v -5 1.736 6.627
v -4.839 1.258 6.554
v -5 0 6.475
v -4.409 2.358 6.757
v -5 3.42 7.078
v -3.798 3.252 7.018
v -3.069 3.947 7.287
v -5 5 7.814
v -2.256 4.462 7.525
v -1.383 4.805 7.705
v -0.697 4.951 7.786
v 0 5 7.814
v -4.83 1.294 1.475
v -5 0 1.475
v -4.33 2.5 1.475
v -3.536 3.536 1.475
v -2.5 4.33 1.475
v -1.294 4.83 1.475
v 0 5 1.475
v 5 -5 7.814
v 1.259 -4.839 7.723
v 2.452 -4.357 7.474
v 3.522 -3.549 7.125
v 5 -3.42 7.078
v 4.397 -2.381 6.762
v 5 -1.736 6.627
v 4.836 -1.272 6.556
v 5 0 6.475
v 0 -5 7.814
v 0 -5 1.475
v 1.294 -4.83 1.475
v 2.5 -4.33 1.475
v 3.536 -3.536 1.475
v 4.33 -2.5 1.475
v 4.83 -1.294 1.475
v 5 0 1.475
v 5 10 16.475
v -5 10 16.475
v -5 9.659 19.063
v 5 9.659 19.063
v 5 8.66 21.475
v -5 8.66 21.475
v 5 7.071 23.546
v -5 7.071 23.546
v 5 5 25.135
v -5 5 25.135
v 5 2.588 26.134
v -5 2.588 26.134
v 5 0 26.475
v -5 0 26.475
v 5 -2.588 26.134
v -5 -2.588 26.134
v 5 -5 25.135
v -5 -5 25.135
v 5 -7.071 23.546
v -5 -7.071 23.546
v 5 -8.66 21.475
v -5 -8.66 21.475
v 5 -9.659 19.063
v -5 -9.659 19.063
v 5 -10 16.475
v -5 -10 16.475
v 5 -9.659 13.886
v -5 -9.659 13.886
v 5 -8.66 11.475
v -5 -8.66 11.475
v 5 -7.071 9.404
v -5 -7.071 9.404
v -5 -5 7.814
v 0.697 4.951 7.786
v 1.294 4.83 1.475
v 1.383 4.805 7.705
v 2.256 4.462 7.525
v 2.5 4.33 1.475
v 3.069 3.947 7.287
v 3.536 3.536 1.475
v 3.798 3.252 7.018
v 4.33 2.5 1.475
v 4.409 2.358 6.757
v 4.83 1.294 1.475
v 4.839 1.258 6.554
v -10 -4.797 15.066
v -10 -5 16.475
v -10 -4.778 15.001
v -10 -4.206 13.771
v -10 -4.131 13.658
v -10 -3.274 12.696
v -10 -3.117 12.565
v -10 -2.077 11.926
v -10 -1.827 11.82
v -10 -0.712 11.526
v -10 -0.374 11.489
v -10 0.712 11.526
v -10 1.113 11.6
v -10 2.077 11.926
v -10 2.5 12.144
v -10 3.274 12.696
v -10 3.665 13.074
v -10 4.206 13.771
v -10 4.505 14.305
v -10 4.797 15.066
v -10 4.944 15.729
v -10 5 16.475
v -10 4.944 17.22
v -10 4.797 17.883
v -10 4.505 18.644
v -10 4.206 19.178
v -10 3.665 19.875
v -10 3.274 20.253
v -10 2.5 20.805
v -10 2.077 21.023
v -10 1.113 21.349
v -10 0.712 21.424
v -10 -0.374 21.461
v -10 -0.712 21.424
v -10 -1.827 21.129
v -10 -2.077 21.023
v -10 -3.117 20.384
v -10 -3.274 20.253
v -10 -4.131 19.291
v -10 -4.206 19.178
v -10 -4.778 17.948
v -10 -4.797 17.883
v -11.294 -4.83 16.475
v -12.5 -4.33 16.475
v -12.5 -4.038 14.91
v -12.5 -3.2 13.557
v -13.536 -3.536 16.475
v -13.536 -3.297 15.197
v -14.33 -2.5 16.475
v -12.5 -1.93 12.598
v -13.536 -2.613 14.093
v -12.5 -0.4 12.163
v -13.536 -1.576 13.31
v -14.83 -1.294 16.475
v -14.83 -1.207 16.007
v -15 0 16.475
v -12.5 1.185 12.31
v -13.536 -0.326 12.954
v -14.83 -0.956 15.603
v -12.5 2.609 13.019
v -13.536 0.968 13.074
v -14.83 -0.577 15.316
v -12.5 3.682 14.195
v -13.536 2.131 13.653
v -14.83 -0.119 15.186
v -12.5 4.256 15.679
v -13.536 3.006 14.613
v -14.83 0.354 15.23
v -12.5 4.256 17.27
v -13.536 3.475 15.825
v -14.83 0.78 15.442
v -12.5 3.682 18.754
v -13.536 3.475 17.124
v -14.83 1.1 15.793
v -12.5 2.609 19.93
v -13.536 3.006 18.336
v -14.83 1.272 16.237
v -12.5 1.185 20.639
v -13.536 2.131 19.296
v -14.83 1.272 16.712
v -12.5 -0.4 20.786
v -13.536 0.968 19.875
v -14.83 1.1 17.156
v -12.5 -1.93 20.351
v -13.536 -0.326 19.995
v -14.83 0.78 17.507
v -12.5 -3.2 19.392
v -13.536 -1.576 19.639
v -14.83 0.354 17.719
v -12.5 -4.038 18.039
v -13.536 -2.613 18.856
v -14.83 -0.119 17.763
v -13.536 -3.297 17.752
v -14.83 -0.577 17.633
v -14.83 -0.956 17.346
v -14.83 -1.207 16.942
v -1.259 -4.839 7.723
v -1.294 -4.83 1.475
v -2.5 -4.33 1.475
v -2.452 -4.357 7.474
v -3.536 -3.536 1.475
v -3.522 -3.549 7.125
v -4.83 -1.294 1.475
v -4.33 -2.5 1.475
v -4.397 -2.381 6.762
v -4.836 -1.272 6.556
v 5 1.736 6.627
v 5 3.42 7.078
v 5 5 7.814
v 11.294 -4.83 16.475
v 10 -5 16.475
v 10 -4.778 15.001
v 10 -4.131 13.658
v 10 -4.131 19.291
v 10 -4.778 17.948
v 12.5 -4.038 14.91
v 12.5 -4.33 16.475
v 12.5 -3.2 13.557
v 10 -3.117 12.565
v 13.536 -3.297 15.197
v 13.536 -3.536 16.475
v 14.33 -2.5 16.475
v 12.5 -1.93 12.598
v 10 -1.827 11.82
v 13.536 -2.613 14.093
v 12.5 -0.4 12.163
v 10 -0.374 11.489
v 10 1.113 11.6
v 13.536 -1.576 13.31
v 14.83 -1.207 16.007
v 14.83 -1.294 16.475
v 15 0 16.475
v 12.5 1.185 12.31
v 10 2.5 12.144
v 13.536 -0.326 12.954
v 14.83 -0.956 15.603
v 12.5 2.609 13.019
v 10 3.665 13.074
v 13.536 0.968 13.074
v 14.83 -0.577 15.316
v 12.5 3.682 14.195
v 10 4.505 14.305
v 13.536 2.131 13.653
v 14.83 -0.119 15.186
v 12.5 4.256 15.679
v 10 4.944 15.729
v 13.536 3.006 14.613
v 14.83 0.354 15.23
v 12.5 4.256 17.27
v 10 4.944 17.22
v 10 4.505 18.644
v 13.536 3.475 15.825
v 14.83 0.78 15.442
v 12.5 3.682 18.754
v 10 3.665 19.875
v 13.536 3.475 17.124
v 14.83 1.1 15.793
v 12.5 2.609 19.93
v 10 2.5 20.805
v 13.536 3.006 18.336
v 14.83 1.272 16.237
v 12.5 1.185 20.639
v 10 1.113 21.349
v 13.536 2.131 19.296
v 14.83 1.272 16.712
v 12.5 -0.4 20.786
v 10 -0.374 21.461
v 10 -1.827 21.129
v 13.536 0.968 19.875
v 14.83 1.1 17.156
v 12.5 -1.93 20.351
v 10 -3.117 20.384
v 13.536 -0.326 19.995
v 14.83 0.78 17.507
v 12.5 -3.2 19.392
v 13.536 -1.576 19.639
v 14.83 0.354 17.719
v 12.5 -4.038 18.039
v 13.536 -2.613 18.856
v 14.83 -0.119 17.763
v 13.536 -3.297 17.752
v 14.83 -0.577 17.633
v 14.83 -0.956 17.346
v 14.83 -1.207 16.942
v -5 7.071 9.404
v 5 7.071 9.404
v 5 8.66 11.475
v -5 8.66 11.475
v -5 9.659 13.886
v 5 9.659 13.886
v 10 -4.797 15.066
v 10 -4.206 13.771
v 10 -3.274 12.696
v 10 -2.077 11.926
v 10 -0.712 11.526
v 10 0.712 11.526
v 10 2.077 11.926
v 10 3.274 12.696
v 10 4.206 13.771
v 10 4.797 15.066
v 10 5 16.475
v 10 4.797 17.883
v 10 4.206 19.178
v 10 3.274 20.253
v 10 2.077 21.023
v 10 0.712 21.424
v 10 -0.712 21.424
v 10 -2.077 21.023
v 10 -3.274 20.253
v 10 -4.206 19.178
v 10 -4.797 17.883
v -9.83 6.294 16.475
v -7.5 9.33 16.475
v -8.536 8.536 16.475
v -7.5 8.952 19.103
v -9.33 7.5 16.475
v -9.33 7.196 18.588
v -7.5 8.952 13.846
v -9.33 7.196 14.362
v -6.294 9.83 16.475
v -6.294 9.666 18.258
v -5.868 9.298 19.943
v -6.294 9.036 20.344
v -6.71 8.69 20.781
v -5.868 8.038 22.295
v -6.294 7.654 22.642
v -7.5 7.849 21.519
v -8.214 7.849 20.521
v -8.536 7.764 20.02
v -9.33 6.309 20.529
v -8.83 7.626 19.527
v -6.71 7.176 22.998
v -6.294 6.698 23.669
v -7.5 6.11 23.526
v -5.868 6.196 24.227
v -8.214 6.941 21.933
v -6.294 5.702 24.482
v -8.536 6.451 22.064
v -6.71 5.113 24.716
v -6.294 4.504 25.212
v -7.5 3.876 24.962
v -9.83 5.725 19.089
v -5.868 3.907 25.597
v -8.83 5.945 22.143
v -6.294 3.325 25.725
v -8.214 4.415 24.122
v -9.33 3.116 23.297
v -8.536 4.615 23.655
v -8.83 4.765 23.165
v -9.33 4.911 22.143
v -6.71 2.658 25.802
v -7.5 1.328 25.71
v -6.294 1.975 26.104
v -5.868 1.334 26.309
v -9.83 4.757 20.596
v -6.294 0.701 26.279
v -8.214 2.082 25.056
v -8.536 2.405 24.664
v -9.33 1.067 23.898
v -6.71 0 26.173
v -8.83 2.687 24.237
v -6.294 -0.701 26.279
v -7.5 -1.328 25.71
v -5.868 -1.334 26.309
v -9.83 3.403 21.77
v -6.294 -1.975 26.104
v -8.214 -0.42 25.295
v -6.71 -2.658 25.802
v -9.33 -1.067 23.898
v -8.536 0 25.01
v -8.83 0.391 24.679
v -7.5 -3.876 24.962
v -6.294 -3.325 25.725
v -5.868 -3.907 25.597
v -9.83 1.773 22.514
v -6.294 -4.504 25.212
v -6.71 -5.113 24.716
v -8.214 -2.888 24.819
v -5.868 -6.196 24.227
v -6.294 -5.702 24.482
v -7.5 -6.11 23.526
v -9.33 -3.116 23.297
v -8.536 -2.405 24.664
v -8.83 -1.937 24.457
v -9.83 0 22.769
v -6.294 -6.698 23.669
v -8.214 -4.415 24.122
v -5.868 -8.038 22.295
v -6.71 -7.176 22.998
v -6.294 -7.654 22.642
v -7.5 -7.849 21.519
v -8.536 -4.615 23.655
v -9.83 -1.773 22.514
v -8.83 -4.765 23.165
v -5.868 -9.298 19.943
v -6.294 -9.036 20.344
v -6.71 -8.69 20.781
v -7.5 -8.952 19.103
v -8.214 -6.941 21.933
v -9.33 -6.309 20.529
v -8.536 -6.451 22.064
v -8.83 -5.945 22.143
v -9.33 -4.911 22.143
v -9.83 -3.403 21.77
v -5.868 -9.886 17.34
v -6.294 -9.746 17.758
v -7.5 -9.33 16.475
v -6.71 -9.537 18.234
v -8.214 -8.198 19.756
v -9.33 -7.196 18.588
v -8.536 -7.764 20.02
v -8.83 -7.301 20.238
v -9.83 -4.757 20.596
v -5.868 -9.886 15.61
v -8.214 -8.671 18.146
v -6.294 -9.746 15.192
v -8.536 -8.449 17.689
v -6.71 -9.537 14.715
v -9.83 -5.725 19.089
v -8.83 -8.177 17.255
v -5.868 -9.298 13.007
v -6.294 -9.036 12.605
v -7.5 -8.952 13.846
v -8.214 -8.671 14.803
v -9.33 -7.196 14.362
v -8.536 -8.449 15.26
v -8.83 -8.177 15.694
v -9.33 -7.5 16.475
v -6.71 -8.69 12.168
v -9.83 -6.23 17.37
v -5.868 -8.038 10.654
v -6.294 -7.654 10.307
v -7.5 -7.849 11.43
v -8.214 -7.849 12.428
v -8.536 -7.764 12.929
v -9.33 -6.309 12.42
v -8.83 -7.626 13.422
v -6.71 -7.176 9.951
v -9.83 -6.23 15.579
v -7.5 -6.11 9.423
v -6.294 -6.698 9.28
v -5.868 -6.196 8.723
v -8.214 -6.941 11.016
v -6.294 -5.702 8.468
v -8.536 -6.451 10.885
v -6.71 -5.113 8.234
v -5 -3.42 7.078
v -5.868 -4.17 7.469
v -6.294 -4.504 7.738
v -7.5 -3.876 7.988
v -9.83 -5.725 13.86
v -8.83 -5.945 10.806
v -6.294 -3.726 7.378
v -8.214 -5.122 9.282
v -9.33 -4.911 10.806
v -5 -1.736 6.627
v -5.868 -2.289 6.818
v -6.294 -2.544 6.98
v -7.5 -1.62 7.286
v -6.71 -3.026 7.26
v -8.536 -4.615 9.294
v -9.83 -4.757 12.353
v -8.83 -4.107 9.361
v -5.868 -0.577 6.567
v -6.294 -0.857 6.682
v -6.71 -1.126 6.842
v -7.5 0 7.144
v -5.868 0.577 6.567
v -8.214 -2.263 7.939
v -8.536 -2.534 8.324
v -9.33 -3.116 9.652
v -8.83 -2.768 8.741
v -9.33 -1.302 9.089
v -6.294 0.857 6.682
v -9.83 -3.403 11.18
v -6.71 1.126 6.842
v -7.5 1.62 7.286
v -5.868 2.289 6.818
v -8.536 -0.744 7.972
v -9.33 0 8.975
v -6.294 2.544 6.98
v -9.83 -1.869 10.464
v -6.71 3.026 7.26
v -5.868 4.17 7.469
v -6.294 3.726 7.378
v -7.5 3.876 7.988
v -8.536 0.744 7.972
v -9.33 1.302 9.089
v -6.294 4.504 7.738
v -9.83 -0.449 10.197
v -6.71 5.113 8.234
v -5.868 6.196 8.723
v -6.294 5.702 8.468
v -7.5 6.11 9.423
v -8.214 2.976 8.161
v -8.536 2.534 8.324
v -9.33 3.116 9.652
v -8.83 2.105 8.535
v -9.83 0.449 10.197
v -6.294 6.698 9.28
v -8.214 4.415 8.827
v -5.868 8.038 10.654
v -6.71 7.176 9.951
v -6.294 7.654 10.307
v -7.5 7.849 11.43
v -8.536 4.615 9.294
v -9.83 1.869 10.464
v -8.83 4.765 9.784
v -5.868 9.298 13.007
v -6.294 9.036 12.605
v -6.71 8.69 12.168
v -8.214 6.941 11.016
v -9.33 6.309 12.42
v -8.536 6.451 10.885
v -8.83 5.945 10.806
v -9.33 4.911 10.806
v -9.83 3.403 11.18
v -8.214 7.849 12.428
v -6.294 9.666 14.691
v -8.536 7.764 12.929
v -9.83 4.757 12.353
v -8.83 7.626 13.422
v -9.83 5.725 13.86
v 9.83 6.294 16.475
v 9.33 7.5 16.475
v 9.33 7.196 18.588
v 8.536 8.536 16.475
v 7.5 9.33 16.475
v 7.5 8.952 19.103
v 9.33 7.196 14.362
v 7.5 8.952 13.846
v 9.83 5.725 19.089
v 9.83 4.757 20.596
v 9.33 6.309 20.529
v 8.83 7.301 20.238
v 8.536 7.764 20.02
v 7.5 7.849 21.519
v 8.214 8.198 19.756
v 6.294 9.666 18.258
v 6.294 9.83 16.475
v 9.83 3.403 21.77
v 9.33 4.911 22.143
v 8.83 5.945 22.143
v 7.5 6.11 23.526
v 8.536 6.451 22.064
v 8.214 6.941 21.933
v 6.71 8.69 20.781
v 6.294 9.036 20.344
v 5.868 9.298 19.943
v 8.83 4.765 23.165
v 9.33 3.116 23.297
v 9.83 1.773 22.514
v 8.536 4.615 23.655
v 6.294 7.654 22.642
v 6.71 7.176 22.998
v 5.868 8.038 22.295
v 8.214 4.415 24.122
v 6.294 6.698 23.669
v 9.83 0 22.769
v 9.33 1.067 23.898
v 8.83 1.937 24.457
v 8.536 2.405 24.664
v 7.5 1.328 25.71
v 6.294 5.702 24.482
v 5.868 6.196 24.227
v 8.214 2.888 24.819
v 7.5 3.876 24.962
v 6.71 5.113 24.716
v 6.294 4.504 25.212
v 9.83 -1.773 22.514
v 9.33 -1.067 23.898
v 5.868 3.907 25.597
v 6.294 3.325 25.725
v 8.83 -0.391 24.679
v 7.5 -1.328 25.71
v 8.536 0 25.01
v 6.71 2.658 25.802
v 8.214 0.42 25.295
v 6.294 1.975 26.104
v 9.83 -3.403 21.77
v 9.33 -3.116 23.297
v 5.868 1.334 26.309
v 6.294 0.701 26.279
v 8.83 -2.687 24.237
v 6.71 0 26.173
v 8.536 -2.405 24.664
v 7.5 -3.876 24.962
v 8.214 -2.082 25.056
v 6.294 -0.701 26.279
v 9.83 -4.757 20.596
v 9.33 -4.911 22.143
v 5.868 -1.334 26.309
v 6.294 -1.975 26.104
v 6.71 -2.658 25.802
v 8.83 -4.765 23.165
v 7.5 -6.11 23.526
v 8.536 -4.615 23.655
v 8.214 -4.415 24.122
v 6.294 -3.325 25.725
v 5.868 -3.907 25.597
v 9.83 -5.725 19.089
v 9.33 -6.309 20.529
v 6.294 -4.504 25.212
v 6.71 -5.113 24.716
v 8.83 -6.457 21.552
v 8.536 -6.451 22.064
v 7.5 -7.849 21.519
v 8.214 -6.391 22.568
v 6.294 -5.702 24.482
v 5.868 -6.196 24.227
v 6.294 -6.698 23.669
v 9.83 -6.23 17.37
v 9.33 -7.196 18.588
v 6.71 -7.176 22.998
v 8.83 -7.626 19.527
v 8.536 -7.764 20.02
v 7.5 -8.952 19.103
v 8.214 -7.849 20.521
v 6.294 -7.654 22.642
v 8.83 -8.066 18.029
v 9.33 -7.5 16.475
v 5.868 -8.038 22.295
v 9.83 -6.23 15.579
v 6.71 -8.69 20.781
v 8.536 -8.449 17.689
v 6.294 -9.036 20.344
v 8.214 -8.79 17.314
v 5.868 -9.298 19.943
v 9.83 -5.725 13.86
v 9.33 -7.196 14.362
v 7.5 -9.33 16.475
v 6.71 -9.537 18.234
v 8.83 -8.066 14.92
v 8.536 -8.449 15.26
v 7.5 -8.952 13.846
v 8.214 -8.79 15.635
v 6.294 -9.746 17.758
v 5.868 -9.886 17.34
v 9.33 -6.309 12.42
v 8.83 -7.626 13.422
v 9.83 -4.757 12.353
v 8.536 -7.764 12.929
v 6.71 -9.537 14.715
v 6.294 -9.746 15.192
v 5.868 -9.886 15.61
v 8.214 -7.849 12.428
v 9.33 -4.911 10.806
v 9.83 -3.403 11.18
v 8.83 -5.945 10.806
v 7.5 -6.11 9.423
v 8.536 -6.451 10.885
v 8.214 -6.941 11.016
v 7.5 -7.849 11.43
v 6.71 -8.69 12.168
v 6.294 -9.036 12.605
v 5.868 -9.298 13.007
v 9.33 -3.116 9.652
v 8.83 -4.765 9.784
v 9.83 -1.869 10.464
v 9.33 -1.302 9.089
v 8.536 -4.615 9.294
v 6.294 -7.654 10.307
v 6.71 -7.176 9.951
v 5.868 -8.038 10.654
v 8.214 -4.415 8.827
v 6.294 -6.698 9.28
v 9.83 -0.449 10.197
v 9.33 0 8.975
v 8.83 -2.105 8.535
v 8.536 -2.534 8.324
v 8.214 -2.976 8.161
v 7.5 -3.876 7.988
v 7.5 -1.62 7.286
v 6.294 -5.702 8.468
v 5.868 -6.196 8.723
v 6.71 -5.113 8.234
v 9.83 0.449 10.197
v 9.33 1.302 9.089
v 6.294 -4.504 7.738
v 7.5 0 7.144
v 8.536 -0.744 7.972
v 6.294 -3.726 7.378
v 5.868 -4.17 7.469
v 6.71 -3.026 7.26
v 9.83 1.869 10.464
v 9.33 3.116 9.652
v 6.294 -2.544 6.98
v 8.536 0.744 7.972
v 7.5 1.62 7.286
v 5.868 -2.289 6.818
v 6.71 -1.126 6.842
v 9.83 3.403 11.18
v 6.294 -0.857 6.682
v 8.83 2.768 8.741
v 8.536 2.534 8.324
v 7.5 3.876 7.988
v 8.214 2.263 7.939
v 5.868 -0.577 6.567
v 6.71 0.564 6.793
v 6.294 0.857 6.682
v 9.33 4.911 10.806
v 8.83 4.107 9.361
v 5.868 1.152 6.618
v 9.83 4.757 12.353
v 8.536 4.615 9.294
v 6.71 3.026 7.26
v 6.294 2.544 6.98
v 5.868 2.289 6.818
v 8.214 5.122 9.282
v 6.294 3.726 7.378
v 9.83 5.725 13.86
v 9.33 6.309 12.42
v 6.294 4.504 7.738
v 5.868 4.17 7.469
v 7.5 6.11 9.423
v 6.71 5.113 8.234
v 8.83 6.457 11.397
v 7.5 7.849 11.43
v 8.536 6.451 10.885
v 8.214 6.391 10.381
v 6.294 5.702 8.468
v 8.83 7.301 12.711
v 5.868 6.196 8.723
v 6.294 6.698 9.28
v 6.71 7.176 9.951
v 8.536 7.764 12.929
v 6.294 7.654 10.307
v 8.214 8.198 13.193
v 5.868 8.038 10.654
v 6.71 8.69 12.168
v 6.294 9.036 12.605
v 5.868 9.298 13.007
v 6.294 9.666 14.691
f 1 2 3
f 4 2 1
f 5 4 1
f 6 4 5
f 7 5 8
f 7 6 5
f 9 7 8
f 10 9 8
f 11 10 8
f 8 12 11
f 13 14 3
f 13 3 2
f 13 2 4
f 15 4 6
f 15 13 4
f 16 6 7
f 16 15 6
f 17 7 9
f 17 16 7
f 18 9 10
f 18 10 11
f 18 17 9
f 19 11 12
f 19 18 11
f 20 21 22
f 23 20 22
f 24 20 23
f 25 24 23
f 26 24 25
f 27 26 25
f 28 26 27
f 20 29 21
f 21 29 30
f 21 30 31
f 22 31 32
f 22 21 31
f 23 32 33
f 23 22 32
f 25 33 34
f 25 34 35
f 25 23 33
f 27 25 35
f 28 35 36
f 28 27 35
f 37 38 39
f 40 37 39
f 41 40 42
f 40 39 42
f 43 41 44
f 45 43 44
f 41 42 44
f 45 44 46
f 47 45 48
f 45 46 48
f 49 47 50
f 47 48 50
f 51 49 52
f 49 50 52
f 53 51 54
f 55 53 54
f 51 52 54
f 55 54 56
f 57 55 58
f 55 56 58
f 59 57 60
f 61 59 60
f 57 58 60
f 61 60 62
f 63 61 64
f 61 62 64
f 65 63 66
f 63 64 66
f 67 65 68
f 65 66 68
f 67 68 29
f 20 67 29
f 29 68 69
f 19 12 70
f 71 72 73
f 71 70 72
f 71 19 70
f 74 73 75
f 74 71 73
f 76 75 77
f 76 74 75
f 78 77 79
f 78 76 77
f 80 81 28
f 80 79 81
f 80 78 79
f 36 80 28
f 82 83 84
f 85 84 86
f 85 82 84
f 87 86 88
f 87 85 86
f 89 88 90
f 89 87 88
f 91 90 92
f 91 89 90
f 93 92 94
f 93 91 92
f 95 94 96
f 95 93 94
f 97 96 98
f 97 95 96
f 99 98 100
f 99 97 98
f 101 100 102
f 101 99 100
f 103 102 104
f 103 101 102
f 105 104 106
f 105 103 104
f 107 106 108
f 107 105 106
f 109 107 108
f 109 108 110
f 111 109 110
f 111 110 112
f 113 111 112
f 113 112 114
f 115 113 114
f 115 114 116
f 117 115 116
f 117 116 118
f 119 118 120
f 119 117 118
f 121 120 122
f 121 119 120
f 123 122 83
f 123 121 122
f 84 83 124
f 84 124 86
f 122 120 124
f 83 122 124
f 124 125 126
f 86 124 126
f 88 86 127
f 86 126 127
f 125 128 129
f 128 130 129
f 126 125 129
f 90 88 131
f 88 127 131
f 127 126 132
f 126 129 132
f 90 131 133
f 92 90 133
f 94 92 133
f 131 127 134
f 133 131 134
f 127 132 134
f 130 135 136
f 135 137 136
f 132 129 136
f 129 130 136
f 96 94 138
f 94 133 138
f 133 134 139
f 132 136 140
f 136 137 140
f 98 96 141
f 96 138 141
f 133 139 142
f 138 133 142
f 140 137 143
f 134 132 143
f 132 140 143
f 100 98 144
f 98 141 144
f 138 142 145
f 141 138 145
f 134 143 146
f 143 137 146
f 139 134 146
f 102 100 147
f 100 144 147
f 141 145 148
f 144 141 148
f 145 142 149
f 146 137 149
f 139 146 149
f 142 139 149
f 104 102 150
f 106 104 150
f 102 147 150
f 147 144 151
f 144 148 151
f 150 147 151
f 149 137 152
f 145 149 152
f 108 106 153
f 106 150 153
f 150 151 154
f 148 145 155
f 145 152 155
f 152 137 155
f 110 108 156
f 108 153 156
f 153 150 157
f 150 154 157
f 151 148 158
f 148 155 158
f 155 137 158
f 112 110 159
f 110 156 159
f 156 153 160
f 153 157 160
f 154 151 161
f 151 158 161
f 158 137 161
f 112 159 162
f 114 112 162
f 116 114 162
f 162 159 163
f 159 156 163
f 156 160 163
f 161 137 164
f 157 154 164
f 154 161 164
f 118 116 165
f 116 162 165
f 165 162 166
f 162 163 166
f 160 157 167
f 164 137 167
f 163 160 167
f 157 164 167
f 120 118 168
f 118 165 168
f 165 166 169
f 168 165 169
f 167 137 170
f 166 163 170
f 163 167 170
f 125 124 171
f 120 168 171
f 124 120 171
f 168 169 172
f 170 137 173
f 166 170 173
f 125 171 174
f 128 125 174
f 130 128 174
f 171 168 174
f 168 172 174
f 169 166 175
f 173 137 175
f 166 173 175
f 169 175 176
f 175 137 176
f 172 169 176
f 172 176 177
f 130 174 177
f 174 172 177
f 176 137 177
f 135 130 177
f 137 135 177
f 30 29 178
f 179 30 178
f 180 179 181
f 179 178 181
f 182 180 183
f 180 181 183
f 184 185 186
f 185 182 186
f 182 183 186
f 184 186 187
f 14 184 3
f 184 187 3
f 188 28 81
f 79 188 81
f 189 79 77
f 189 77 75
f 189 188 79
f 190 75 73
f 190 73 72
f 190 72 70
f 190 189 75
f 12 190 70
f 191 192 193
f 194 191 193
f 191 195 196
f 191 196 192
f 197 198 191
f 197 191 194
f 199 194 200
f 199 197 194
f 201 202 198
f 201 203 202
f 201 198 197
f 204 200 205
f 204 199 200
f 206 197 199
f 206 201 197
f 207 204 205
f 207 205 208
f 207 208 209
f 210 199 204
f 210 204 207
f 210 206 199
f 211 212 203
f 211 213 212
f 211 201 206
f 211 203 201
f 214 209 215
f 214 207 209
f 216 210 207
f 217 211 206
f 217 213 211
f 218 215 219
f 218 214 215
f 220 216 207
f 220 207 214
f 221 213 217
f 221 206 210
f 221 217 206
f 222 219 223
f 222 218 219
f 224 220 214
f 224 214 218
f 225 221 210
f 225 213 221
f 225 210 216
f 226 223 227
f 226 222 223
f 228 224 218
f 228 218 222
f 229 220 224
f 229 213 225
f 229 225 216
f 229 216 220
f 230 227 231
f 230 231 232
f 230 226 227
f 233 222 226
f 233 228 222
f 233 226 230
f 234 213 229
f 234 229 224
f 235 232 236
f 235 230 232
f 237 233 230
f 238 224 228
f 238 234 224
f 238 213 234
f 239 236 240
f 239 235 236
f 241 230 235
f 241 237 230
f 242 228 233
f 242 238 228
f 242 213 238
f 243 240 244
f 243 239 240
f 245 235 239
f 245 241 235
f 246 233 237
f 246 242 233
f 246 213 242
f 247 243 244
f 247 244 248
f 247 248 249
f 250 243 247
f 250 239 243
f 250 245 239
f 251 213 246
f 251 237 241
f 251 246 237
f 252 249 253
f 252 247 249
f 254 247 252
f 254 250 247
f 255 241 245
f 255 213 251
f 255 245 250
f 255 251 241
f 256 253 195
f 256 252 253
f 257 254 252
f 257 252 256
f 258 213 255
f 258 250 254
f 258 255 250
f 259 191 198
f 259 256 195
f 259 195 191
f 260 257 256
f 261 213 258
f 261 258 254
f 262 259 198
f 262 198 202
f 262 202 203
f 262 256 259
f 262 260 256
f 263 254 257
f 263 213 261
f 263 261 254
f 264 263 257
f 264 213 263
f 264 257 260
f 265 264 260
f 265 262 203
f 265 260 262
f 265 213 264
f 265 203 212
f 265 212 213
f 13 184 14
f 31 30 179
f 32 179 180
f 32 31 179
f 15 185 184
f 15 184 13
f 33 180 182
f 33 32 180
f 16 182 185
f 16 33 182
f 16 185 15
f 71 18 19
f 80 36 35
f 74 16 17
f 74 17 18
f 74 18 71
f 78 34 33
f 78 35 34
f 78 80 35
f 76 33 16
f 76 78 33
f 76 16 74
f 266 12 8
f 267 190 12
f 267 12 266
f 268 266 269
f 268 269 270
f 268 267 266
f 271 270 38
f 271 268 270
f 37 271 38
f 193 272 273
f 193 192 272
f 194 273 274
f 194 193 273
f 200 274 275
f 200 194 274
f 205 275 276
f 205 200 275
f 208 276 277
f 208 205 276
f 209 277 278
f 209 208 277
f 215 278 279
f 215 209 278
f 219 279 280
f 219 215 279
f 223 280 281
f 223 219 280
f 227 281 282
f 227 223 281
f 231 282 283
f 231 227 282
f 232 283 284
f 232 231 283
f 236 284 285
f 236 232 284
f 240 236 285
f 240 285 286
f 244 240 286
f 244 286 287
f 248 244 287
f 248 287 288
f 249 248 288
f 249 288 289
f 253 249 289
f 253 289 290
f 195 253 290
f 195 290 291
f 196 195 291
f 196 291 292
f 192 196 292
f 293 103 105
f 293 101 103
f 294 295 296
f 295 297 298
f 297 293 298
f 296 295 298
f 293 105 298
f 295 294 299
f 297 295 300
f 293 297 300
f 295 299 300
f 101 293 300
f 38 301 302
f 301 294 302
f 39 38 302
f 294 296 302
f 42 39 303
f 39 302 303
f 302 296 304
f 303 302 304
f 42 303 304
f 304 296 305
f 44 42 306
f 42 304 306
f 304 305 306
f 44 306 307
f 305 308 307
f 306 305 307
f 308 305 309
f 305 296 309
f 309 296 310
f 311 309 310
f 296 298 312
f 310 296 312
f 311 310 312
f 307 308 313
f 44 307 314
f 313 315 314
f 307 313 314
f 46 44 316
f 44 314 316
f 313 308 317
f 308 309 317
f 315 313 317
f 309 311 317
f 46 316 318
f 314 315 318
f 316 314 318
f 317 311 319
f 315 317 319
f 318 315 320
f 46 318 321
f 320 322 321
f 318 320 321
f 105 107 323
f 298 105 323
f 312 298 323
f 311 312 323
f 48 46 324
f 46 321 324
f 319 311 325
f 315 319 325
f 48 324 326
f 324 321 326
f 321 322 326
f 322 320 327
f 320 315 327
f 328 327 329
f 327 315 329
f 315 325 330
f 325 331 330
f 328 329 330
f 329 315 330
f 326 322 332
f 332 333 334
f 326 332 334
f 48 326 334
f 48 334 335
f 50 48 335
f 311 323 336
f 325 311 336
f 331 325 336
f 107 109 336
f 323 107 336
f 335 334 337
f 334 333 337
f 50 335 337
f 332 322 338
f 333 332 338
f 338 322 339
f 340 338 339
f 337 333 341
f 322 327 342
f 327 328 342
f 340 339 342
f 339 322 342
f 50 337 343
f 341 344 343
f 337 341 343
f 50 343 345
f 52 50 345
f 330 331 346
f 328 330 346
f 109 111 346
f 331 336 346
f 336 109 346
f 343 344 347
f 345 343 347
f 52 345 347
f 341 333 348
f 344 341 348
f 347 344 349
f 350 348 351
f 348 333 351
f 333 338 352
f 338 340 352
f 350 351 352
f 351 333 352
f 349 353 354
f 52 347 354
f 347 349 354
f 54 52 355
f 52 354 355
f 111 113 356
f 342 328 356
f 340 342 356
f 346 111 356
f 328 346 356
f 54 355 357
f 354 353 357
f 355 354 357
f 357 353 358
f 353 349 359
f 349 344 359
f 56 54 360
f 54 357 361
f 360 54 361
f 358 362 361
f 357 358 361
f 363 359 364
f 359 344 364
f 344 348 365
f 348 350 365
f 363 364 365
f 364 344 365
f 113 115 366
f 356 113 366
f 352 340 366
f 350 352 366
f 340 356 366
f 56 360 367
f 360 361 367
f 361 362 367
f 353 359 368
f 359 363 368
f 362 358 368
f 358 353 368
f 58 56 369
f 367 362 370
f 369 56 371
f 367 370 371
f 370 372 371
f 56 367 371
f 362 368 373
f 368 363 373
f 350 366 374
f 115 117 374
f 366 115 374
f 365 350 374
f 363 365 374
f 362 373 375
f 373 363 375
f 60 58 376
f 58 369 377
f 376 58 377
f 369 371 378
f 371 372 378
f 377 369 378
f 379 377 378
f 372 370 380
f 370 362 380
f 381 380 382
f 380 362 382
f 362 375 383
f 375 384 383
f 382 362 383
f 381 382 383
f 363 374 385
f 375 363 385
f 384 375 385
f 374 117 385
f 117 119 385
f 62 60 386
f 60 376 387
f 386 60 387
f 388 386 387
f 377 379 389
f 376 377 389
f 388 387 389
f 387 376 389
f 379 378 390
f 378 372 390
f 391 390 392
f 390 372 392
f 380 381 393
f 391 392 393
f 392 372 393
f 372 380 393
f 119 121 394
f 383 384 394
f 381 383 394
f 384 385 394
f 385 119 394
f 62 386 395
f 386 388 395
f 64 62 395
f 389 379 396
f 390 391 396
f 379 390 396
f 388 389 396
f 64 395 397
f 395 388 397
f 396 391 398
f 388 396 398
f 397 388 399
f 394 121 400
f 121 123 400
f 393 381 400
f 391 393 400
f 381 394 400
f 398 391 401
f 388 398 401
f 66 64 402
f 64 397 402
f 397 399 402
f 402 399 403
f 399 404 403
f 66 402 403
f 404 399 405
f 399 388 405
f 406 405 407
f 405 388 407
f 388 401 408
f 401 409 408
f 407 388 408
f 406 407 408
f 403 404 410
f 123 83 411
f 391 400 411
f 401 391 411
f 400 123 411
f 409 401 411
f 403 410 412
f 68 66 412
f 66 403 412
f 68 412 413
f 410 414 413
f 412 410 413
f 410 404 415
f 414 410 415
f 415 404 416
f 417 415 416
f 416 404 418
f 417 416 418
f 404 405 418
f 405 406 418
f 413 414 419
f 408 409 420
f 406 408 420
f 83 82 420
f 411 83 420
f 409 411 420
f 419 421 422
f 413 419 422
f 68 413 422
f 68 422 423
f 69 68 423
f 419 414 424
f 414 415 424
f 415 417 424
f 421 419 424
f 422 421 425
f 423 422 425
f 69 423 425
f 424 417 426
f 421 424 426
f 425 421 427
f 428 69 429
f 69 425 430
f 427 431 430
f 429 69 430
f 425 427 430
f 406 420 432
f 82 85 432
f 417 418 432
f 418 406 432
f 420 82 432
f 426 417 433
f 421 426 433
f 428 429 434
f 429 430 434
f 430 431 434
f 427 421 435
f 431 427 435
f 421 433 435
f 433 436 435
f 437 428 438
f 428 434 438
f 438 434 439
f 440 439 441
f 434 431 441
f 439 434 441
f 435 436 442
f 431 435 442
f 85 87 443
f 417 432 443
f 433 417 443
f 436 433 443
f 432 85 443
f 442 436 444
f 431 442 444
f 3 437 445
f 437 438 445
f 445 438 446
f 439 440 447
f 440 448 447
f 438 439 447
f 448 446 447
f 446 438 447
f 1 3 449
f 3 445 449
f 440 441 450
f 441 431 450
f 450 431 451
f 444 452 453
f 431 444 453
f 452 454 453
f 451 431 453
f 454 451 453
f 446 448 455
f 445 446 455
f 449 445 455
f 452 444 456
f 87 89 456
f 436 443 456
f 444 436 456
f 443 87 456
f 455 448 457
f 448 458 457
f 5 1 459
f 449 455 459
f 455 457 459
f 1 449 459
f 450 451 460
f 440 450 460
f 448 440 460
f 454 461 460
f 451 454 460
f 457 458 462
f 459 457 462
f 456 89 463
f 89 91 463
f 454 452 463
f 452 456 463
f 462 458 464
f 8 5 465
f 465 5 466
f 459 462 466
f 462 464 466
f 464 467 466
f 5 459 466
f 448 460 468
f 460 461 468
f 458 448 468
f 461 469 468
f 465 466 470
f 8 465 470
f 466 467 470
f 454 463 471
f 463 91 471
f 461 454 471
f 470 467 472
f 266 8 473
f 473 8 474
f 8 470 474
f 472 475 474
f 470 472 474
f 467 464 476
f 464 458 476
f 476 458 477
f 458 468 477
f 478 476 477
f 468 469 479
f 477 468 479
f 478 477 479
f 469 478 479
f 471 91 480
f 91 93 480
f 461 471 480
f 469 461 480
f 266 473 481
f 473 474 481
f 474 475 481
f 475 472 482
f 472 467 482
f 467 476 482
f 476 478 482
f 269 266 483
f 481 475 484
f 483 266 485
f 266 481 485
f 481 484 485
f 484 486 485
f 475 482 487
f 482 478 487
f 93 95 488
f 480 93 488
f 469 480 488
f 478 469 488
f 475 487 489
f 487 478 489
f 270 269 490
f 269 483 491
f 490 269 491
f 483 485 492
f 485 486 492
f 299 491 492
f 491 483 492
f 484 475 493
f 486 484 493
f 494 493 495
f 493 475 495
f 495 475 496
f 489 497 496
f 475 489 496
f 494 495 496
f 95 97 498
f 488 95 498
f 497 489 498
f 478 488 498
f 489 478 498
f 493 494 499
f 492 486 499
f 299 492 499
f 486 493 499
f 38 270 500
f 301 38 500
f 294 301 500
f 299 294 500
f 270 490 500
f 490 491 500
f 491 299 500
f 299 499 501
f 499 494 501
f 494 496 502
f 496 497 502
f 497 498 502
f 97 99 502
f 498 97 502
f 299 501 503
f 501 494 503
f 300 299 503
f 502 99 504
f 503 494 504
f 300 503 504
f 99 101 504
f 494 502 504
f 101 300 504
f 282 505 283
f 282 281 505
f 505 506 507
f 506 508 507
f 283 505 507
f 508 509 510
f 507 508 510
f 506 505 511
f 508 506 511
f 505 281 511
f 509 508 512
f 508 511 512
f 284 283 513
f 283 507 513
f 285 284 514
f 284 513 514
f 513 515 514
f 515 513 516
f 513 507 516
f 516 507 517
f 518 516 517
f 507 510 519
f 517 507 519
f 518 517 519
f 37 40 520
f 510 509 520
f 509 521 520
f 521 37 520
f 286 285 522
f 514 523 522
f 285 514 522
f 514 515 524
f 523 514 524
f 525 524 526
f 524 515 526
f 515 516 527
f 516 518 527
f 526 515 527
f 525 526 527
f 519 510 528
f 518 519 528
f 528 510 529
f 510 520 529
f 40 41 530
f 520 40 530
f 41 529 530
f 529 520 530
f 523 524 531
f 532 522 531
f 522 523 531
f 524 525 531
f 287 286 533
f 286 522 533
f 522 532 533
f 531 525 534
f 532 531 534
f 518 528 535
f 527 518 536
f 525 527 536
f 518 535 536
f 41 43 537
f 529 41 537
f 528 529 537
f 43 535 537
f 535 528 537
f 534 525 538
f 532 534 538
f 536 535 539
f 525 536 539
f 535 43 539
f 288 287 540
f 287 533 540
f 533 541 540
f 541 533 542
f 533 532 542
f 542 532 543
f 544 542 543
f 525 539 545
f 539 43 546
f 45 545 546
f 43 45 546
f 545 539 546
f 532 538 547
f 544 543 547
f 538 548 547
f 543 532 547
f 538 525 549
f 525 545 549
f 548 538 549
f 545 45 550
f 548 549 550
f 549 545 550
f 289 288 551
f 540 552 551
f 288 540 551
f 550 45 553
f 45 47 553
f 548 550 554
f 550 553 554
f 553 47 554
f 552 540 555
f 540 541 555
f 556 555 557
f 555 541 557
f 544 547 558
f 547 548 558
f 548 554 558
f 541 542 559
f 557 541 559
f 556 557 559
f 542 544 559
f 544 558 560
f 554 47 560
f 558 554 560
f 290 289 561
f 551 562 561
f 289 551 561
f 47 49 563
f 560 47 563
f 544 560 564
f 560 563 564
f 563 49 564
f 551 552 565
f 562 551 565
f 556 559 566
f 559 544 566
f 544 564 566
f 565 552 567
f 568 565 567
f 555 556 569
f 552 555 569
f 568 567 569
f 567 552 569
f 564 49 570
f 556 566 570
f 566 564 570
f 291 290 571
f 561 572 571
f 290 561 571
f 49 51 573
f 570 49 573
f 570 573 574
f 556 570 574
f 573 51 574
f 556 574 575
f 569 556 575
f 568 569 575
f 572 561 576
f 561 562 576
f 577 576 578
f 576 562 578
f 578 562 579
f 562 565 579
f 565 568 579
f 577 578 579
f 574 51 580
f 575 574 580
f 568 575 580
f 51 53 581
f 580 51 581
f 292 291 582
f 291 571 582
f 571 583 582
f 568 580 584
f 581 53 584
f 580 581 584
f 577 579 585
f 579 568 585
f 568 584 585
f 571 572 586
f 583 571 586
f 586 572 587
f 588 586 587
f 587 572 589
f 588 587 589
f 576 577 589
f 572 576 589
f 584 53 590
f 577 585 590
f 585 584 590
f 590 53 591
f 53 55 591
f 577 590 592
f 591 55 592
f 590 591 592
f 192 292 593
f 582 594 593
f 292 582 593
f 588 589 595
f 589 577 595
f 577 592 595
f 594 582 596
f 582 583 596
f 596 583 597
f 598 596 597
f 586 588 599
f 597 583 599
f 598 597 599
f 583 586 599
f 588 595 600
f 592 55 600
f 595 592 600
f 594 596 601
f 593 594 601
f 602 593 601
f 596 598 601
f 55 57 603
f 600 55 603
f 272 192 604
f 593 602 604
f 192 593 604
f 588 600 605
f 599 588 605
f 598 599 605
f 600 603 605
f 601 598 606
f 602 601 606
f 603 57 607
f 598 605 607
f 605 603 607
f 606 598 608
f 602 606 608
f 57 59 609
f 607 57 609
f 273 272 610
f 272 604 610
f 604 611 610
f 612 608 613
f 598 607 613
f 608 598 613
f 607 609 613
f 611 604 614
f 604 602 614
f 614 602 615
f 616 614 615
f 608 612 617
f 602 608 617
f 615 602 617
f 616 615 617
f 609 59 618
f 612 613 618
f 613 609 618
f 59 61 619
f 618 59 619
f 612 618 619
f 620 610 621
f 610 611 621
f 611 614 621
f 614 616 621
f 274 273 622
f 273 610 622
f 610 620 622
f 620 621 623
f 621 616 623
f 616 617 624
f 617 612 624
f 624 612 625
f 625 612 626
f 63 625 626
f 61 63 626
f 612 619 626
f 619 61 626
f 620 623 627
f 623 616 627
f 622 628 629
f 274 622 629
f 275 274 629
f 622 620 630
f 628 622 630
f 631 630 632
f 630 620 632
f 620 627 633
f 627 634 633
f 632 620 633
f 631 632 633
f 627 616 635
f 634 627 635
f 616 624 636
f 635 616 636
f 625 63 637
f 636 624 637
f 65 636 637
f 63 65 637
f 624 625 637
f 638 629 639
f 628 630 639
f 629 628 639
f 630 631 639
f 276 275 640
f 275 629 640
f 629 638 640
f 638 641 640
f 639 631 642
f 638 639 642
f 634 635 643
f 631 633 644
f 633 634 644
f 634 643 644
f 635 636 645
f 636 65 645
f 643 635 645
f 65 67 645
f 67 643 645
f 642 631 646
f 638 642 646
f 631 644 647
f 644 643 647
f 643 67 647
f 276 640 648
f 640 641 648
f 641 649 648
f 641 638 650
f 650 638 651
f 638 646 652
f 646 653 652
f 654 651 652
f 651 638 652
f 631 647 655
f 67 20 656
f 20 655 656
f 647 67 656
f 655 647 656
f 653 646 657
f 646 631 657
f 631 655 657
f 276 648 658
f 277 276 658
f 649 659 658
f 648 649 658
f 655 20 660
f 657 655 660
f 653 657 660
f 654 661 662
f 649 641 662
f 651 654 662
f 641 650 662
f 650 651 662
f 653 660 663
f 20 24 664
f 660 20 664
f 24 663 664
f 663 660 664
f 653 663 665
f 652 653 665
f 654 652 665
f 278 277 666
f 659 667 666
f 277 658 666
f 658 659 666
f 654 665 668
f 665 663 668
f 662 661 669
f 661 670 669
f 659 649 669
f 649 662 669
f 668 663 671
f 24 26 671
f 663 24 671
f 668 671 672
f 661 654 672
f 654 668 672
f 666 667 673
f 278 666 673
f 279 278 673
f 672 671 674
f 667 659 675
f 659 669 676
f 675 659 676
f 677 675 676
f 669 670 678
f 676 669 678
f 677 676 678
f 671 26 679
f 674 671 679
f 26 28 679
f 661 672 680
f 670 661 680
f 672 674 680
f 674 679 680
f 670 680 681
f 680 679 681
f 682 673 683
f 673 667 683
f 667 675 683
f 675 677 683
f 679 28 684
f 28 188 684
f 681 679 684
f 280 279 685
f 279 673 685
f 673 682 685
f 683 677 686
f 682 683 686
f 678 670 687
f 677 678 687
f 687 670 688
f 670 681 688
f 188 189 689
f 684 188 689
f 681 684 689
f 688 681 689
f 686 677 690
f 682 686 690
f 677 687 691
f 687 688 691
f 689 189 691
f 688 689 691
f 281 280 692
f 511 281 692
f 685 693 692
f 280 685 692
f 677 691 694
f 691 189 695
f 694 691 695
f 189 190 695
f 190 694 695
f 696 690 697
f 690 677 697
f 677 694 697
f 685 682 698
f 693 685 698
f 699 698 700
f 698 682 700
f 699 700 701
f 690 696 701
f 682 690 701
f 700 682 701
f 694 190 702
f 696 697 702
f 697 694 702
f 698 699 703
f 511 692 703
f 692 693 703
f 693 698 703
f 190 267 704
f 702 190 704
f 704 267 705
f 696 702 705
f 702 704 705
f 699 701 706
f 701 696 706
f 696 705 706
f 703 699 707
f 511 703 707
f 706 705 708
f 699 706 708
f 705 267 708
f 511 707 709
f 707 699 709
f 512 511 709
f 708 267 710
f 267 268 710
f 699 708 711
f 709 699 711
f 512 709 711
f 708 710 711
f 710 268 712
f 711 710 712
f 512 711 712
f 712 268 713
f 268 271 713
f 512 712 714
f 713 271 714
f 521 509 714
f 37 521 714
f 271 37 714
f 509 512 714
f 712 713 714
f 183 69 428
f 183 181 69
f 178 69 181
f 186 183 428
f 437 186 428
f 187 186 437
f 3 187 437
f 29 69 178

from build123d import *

# Parameters (mm, degrees)
F1_DEPTH      = 15
F1_DEPTH_BACK = 15
F2_DEPTH      = 10
F2_DEPTH_BACK = 10
F3_DEPTH      = 5
F3_DEPTH_BACK = 5
F4_R          = 4.99999
F5_T8_DEPTH   = 31.3397459622
F5_S9_R       = 10
F5_T10_DEPTH  = 18
F5_T14_DEPTH  = 31.3397459622
F5_S15_R      = 10
F5_T16_DEPTH  = 18
F5_T20_DEPTH  = 31.3397459622
F5_S21_R      = 10
F5_T22_DEPTH  = 18
F5_T26_DEPTH  = 31.3397459622
F5_S27_R      = 10
F5_T28_DEPTH  = 18


# Not quite as in the source:
# - a fillet or chamfer that OpenCascade refuses, or shapes differently, is made with other operations: its cross-section is extruded or revolved along the edge and cut away or added
# - a fillet or chamfer is up to 0.001 mm smaller than in the source, because OpenCascade refuses the exact size


with BuildPart() as f1:
    # F0 (on Right) → F1 (new body, two sides)
    with BuildSketch(Plane.YZ) as f1_sk:
        with BuildLine():
            Line((-5, 16.4746102661), (5, 16.4746102661))
            ThreePointArc((5, 16.4746102661), (0, 21.4746102661), (-5, 16.4746102661))
        make_face()
        with BuildLine():
            ThreePointArc((-5, 16.4746102661), (0, 11.4746102661), (5, 16.4746102661))
            Line((5, 16.4746102661), (-5, 16.4746102661))
        make_face()
    extrude(amount=F1_DEPTH)
    extrude(f1_sk.sketch, amount=-F1_DEPTH_BACK)

    # F0 (on Right) → F2 (join, two sides)
    with BuildSketch(Plane.YZ) as f2_sk:
        with BuildLine():
            ThreePointArc((-5, 16.4746102661), (0, 21.4746102661), (5, 16.4746102661))
            Line((5, 16.4746102661), (5, 7.8143562283))
            ThreePointArc((5, 7.8143562283), (8.6602540378, 11.4746102661), (10, 16.4746102661))
            ThreePointArc((10, 16.4746102661), (-5, 25.1348643039), (-5, 7.8143562283))
            Line((-5, 7.8143562283), (-5, 16.4746102661))
        make_face()
        with BuildLine():
            Line((5, 7.8143562283), (5, 16.4746102661))
            ThreePointArc((5, 16.4746102661), (0, 11.4746102661), (-5, 16.4746102661))
            Line((-5, 16.4746102661), (-5, 7.8143562283))
            ThreePointArc((-5, 7.8143562283), (0, 6.4746102661), (5, 7.8143562283))
        make_face()
    extrude(amount=F2_DEPTH)
    extrude(f2_sk.sketch, amount=-F2_DEPTH_BACK)

    # F0 (on Right) → F3 (join, two sides)
    with BuildSketch(Plane.YZ) as f3_sk:
        with BuildLine():
            Line((5, 1.4746102661), (5, 7.8143562283))
            ThreePointArc((5, 7.8143562283), (0, 6.4746102661), (-5, 7.8143562283))
            Line((-5, 7.8143562283), (-5, 1.4746102661))
            Line((-5, 1.4746102661), (5, 1.4746102661))
        make_face()
    extrude(amount=F3_DEPTH)
    extrude(f3_sk.sketch, amount=-F3_DEPTH_BACK)

    # F4 (radius 5 in the source; OpenCascade refuses exactly that, so slightly less here)
    f4_edges = [f1.edges().sort_by_distance(p)[0] for p in [
        (15, 5, 16.47461),
        (-15, 5, 16.47461),
    ]]
    fillet(f4_edges, radius=F4_R)

    # F5: fillet of radius 5 on 8 edges, made by hand

    # F5_s1 → F5_t2 (revolve, cut)
    with BuildSketch(Plane.XY.offset(16.4746102661)):
        with BuildLine():
            ThreePointArc((-5, 10), (-8.5355339059, 8.5355339059), (-10, 5))
            Line((-10, 5), (-10, 10))
            Line((-10, 10), (-5, 10))
        make_face()
    revolve(axis=Axis((-10, 0, 16.4746102661), (1, 0, 0)), mode=Mode.SUBTRACT)

    # F5_s3 → F5_t4 (revolve, cut)
    with BuildSketch(Plane.XY.offset(16.4746102661)):
        with BuildLine():
            ThreePointArc((10, 5), (8.5355339059, 8.5355339059), (5, 10))
            Line((5, 10), (10, 10))
            Line((10, 10), (10, 5))
        make_face()
    revolve(axis=Axis((10, 0, 16.4746102661), (1, 0, 0)), mode=Mode.SUBTRACT)


with BuildPart() as f5_tool6:
    # F5_s7 → F5_t8 (new body)
    with BuildSketch(Plane.XY.offset(-11.0253897339)):
        with BuildLine():
            ThreePointArc((-5, 0), (-3.5355339059, 3.5355339059), (0, 5))
            Line((0, 5), (-5, 5))
            Line((-5, 5), (-5, 0))
        make_face()
    extrude(amount=F5_T8_DEPTH)

    # F5_s9 → F5_t10 (cut, symmetric)
    with BuildSketch(Plane.YZ.offset(-2.5)):
        with Locations((0, 16.4746102661)):
            Circle(F5_S9_R)
    extrude(amount=F5_T10_DEPTH, both=True, mode=Mode.SUBTRACT)


with BuildPart() as f1_1:
    add(f1.part)

    # F5_t5: cut F5_tool6
    add(f5_tool6.part, mode=Mode.SUBTRACT)


with BuildPart() as f5_tool12:
    # F5_s13 → F5_t14 (new body)
    with BuildSketch(Plane.XY.offset(-11.0253897339)):
        with BuildLine():
            ThreePointArc((0, 5), (3.5355339059, 3.5355339059), (5, 0))
            Line((5, 0), (5, 5))
            Line((5, 5), (0, 5))
        make_face()
    extrude(amount=F5_T14_DEPTH)

    # F5_s15 → F5_t16 (cut, symmetric)
    with BuildSketch(Plane.YZ.offset(2.5)):
        with Locations((0, 16.4746102661)):
            Circle(F5_S15_R)
    extrude(amount=F5_T16_DEPTH, both=True, mode=Mode.SUBTRACT)


with BuildPart() as f1_2:
    add(f1_1.part)

    # F5_t11: cut F5_tool12
    add(f5_tool12.part, mode=Mode.SUBTRACT)


with BuildPart() as f5_tool18:
    # F5_s19 → F5_t20 (new body)
    with BuildSketch(Plane.XY.offset(20.3143562283)):
        with BuildLine():
            ThreePointArc((0, -5), (3.5355339059, -3.5355339059), (5, 0))
            Line((5, 0), (5, -5))
            Line((5, -5), (0, -5))
        make_face()
    extrude(amount=-F5_T20_DEPTH)

    # F5_s21 → F5_t22 (cut, symmetric)
    with BuildSketch(Plane.YZ.offset(2.5)):
        with Locations((0, 16.4746102661)):
            Circle(F5_S21_R)
    extrude(amount=F5_T22_DEPTH, both=True, mode=Mode.SUBTRACT)


with BuildPart() as f1_3:
    add(f1_2.part)

    # F5_t17: cut F5_tool18
    add(f5_tool18.part, mode=Mode.SUBTRACT)


with BuildPart() as f5_tool24:
    # F5_s25 → F5_t26 (new body)
    with BuildSketch(Plane.XY.offset(20.3143562283)):
        with BuildLine():
            ThreePointArc((0, -5), (-3.5355339059, -3.5355339059), (-5, 0))
            Line((-5, 0), (-5, -5))
            Line((-5, -5), (0, -5))
        make_face()
    extrude(amount=-F5_T26_DEPTH)

    # F5_s27 → F5_t28 (cut, symmetric)
    with BuildSketch(Plane.YZ.offset(-2.5)):
        with Locations((0, 16.4746102661)):
            Circle(F5_S27_R)
    extrude(amount=F5_T28_DEPTH, both=True, mode=Mode.SUBTRACT)


with BuildPart() as f1_4:
    add(f1_3.part)

    # F5_t23: cut F5_tool24
    add(f5_tool24.part, mode=Mode.SUBTRACT)


solid = f1_4.part
